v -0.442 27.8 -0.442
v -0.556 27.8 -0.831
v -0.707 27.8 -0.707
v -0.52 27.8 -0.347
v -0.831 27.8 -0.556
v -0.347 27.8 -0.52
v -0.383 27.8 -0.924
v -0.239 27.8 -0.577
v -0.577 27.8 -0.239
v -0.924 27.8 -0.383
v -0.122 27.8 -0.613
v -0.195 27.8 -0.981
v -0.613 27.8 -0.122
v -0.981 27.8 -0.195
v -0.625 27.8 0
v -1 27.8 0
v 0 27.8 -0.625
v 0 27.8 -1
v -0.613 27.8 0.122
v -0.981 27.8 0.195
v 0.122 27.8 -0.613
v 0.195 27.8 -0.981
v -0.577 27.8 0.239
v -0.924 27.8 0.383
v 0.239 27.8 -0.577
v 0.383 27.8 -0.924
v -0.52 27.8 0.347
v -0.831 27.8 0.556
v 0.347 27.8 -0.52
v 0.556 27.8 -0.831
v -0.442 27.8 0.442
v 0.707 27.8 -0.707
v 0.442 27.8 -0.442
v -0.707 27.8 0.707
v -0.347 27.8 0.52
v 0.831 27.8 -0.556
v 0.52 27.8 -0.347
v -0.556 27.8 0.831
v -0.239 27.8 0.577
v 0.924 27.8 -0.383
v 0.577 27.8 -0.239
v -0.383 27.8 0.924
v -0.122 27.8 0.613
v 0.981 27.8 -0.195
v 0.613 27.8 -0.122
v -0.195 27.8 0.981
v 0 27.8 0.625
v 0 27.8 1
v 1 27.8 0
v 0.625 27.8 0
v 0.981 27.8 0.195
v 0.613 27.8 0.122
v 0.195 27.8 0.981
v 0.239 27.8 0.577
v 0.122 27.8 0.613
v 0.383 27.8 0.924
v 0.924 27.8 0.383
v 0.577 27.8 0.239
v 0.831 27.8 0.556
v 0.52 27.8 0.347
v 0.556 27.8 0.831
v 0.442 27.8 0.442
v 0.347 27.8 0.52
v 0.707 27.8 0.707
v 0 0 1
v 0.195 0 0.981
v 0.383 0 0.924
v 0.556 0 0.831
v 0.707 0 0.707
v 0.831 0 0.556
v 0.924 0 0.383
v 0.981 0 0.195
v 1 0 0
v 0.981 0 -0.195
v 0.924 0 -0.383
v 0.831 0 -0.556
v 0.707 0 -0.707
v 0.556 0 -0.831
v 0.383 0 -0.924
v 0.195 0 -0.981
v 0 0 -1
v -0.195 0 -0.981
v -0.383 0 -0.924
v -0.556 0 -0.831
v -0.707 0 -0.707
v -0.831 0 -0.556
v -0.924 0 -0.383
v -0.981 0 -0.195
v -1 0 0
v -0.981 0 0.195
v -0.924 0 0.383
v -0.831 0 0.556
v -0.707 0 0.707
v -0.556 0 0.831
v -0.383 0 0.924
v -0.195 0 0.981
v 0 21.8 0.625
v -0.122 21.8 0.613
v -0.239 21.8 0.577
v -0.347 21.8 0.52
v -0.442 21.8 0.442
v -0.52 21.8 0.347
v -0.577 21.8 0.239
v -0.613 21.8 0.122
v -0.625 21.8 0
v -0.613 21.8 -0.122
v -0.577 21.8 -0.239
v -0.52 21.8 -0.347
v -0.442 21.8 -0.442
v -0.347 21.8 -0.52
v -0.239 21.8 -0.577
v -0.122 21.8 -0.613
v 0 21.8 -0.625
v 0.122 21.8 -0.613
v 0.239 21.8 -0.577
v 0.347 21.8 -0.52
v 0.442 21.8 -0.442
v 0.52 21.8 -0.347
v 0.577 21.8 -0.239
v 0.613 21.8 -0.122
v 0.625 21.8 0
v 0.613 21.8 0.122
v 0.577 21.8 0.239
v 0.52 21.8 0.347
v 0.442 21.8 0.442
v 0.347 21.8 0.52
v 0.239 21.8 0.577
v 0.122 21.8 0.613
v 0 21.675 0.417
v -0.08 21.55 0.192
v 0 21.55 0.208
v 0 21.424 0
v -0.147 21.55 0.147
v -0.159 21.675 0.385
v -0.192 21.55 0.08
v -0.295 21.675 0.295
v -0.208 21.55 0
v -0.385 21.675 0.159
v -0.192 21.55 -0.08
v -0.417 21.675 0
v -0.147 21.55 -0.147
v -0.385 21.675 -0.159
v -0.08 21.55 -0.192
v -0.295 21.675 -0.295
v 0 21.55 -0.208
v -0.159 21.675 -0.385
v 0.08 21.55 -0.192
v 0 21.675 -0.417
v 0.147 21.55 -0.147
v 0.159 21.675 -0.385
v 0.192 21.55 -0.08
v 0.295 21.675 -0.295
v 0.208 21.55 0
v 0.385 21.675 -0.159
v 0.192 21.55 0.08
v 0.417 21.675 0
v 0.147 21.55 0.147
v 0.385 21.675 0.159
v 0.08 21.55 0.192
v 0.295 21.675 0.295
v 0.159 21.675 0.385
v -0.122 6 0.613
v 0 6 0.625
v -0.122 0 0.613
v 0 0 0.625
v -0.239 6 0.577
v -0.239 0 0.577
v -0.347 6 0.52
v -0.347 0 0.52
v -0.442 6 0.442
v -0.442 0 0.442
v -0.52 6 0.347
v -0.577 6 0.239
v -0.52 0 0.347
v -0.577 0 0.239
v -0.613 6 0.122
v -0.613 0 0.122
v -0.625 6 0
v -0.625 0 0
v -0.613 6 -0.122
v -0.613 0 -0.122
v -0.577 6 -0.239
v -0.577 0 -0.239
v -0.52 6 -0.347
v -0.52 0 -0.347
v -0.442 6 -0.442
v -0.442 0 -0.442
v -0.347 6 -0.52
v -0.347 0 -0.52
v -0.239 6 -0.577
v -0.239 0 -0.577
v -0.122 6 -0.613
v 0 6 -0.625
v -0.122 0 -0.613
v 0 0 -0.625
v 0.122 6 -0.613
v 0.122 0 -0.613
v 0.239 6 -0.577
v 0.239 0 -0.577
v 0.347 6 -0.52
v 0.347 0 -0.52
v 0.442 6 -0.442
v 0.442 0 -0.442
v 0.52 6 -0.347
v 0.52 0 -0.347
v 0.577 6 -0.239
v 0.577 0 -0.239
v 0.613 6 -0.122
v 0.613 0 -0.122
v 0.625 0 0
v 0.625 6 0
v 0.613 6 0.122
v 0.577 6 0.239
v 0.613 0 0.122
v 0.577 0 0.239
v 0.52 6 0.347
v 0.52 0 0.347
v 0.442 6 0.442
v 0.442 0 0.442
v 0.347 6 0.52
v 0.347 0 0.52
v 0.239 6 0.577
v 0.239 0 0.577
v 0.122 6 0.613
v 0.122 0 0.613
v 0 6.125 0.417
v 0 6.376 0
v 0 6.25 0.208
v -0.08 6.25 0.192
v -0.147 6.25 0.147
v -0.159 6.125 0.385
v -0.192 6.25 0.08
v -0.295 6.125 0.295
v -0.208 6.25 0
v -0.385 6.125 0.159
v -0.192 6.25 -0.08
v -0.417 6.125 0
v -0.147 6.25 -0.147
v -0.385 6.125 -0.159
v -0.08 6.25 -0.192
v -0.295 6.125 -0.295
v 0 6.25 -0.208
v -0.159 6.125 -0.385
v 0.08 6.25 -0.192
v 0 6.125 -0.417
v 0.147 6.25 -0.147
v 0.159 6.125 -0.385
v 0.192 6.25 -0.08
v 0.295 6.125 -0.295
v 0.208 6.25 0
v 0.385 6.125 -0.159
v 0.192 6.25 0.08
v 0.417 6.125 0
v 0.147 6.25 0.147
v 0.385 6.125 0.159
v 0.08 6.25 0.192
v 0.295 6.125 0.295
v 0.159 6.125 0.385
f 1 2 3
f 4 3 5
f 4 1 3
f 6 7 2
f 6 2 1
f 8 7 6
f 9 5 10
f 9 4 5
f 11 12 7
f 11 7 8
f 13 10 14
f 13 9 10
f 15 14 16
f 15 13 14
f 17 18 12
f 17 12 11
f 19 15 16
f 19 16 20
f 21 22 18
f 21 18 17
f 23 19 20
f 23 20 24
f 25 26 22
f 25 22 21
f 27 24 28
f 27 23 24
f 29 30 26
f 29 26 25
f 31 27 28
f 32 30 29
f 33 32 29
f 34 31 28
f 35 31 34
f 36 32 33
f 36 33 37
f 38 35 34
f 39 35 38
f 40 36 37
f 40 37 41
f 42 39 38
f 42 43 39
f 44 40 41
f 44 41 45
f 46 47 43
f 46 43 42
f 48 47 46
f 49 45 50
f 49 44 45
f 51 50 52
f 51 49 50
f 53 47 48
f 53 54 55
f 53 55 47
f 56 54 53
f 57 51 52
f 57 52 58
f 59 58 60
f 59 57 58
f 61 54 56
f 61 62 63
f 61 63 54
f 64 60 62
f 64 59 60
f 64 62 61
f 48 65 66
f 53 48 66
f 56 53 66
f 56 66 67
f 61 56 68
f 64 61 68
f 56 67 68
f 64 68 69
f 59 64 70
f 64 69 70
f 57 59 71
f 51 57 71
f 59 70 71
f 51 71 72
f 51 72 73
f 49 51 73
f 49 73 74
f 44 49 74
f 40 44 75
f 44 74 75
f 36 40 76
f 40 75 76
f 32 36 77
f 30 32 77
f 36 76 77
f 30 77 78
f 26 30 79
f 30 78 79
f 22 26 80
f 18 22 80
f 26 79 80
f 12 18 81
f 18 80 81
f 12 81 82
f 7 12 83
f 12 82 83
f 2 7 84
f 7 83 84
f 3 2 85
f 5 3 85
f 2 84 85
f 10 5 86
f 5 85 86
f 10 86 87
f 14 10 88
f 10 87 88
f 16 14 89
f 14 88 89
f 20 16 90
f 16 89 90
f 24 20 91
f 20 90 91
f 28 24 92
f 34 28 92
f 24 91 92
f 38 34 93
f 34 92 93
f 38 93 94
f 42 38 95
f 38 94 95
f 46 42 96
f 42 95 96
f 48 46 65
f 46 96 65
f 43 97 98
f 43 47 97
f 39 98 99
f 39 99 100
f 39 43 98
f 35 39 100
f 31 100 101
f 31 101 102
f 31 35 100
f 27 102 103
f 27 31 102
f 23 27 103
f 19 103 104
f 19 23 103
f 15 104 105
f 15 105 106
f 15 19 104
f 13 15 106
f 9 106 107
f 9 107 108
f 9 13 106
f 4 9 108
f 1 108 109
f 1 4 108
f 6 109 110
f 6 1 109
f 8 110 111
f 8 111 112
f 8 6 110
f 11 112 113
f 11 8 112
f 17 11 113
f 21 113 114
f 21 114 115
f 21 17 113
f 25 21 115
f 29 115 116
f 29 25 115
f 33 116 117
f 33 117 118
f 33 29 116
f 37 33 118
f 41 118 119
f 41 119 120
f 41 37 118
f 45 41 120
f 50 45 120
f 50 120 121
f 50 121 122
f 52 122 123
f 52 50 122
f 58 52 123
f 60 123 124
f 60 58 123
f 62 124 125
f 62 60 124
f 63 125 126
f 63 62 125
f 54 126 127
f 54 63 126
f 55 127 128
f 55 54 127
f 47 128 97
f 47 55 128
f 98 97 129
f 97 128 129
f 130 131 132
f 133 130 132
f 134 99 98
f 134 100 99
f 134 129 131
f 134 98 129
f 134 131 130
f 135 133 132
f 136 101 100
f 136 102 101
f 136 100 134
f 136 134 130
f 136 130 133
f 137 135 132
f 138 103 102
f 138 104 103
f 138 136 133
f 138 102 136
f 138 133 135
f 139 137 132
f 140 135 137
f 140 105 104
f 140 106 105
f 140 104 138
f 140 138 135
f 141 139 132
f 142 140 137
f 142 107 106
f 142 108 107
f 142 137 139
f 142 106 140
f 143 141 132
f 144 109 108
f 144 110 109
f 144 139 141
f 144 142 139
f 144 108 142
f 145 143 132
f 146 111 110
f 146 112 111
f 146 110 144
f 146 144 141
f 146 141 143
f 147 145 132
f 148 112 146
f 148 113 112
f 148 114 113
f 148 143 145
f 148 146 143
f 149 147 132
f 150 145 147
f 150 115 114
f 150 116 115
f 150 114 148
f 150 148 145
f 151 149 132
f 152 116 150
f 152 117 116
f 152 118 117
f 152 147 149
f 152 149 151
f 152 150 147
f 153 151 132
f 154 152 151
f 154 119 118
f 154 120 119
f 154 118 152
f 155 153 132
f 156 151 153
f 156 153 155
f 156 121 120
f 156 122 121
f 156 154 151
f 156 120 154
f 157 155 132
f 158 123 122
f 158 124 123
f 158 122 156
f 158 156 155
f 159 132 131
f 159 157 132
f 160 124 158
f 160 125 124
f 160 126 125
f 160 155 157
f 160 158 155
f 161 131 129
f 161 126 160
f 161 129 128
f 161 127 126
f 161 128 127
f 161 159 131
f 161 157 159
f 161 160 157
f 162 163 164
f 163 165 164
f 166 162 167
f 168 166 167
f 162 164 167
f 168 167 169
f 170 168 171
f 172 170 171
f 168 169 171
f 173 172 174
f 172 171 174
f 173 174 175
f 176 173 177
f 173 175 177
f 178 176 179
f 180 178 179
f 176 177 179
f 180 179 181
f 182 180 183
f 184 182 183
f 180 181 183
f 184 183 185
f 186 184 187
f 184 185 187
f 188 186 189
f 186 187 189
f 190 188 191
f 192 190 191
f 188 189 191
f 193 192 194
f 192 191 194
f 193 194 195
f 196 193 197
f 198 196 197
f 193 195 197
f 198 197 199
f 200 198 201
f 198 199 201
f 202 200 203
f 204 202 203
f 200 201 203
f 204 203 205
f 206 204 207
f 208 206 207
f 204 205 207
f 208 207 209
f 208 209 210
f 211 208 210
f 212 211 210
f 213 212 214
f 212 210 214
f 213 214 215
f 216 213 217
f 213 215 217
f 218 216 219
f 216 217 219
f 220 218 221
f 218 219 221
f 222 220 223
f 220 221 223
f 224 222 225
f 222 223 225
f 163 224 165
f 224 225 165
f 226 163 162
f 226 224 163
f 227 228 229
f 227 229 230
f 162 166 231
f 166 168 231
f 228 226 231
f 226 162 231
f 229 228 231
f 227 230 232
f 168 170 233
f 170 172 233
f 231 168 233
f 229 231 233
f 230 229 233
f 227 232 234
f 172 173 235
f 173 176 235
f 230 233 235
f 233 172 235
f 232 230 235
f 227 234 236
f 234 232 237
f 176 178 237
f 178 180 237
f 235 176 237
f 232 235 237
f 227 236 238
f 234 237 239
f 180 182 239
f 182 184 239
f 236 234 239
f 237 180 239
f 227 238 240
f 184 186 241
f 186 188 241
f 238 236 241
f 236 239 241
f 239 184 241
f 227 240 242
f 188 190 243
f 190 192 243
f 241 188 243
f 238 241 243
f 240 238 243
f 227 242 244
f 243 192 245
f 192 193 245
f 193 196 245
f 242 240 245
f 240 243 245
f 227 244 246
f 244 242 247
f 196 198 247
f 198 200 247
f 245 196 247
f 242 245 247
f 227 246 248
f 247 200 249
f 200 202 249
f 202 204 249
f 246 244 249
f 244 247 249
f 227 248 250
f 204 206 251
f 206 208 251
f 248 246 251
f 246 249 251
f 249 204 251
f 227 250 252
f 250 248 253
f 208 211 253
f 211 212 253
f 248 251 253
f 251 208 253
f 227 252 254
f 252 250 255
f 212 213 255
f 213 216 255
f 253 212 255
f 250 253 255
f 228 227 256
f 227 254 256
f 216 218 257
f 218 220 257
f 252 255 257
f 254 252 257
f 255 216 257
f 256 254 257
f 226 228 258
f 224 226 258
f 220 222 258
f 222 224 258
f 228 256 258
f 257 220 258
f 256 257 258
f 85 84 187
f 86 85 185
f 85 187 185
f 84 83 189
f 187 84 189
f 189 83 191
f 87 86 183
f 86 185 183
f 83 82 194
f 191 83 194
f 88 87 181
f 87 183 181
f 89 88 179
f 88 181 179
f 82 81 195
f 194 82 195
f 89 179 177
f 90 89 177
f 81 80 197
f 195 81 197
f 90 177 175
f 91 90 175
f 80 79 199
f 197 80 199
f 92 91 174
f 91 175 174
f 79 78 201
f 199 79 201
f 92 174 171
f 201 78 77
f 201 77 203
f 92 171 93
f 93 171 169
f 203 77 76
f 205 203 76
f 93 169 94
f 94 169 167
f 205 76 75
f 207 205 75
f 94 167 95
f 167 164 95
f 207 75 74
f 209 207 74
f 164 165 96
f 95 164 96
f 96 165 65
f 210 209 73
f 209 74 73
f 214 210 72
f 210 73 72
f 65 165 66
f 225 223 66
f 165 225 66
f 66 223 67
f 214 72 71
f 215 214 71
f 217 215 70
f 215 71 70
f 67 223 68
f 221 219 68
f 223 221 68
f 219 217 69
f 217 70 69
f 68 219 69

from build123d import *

# Parameters (mm, degrees)
SKETCH1_R           = 1
BOSS_EXTRUDE1_DEPTH = 27.8


with BuildPart() as part:
    # Sketch1 → Boss-Extrude1 (new body)
    with BuildSketch(Plane(origin=(0, 0, 0), x_dir=(1, 0, 0), z_dir=(0, 1, 0))):
        with Locations(Location((0, 0, 0), (0, 0, 270))):
            Circle(SKETCH1_R)
    extrude(amount=BOSS_EXTRUDE1_DEPTH)

    # Sketch4 → M1.6x0.35 Tapped Hole1 (revolve, cut)
    with BuildSketch(Plane(origin=(0, 27.8, 0), x_dir=(0, 0, 1), z_dir=(1, 0, 0))):
        Polygon((0, 0), (0, 6.375537887), (0.625, 6), (0.625, 0), align=None)
    m1_6x0_35_tapped_hole1 = revolve(axis=Axis((0, 34.15, 0), (0, -1, 0)), mode=Mode.SUBTRACT)

    # Mirror1: M1.6x0.35 Tapped Hole1 across plane
    add(m1_6x0_35_tapped_hole1.mirror(Plane(origin=(0, 13.9, 0), x_dir=(0, 0, 1), z_dir=(0, -1, 0))), mode=Mode.SUBTRACT)


solid = part.part
